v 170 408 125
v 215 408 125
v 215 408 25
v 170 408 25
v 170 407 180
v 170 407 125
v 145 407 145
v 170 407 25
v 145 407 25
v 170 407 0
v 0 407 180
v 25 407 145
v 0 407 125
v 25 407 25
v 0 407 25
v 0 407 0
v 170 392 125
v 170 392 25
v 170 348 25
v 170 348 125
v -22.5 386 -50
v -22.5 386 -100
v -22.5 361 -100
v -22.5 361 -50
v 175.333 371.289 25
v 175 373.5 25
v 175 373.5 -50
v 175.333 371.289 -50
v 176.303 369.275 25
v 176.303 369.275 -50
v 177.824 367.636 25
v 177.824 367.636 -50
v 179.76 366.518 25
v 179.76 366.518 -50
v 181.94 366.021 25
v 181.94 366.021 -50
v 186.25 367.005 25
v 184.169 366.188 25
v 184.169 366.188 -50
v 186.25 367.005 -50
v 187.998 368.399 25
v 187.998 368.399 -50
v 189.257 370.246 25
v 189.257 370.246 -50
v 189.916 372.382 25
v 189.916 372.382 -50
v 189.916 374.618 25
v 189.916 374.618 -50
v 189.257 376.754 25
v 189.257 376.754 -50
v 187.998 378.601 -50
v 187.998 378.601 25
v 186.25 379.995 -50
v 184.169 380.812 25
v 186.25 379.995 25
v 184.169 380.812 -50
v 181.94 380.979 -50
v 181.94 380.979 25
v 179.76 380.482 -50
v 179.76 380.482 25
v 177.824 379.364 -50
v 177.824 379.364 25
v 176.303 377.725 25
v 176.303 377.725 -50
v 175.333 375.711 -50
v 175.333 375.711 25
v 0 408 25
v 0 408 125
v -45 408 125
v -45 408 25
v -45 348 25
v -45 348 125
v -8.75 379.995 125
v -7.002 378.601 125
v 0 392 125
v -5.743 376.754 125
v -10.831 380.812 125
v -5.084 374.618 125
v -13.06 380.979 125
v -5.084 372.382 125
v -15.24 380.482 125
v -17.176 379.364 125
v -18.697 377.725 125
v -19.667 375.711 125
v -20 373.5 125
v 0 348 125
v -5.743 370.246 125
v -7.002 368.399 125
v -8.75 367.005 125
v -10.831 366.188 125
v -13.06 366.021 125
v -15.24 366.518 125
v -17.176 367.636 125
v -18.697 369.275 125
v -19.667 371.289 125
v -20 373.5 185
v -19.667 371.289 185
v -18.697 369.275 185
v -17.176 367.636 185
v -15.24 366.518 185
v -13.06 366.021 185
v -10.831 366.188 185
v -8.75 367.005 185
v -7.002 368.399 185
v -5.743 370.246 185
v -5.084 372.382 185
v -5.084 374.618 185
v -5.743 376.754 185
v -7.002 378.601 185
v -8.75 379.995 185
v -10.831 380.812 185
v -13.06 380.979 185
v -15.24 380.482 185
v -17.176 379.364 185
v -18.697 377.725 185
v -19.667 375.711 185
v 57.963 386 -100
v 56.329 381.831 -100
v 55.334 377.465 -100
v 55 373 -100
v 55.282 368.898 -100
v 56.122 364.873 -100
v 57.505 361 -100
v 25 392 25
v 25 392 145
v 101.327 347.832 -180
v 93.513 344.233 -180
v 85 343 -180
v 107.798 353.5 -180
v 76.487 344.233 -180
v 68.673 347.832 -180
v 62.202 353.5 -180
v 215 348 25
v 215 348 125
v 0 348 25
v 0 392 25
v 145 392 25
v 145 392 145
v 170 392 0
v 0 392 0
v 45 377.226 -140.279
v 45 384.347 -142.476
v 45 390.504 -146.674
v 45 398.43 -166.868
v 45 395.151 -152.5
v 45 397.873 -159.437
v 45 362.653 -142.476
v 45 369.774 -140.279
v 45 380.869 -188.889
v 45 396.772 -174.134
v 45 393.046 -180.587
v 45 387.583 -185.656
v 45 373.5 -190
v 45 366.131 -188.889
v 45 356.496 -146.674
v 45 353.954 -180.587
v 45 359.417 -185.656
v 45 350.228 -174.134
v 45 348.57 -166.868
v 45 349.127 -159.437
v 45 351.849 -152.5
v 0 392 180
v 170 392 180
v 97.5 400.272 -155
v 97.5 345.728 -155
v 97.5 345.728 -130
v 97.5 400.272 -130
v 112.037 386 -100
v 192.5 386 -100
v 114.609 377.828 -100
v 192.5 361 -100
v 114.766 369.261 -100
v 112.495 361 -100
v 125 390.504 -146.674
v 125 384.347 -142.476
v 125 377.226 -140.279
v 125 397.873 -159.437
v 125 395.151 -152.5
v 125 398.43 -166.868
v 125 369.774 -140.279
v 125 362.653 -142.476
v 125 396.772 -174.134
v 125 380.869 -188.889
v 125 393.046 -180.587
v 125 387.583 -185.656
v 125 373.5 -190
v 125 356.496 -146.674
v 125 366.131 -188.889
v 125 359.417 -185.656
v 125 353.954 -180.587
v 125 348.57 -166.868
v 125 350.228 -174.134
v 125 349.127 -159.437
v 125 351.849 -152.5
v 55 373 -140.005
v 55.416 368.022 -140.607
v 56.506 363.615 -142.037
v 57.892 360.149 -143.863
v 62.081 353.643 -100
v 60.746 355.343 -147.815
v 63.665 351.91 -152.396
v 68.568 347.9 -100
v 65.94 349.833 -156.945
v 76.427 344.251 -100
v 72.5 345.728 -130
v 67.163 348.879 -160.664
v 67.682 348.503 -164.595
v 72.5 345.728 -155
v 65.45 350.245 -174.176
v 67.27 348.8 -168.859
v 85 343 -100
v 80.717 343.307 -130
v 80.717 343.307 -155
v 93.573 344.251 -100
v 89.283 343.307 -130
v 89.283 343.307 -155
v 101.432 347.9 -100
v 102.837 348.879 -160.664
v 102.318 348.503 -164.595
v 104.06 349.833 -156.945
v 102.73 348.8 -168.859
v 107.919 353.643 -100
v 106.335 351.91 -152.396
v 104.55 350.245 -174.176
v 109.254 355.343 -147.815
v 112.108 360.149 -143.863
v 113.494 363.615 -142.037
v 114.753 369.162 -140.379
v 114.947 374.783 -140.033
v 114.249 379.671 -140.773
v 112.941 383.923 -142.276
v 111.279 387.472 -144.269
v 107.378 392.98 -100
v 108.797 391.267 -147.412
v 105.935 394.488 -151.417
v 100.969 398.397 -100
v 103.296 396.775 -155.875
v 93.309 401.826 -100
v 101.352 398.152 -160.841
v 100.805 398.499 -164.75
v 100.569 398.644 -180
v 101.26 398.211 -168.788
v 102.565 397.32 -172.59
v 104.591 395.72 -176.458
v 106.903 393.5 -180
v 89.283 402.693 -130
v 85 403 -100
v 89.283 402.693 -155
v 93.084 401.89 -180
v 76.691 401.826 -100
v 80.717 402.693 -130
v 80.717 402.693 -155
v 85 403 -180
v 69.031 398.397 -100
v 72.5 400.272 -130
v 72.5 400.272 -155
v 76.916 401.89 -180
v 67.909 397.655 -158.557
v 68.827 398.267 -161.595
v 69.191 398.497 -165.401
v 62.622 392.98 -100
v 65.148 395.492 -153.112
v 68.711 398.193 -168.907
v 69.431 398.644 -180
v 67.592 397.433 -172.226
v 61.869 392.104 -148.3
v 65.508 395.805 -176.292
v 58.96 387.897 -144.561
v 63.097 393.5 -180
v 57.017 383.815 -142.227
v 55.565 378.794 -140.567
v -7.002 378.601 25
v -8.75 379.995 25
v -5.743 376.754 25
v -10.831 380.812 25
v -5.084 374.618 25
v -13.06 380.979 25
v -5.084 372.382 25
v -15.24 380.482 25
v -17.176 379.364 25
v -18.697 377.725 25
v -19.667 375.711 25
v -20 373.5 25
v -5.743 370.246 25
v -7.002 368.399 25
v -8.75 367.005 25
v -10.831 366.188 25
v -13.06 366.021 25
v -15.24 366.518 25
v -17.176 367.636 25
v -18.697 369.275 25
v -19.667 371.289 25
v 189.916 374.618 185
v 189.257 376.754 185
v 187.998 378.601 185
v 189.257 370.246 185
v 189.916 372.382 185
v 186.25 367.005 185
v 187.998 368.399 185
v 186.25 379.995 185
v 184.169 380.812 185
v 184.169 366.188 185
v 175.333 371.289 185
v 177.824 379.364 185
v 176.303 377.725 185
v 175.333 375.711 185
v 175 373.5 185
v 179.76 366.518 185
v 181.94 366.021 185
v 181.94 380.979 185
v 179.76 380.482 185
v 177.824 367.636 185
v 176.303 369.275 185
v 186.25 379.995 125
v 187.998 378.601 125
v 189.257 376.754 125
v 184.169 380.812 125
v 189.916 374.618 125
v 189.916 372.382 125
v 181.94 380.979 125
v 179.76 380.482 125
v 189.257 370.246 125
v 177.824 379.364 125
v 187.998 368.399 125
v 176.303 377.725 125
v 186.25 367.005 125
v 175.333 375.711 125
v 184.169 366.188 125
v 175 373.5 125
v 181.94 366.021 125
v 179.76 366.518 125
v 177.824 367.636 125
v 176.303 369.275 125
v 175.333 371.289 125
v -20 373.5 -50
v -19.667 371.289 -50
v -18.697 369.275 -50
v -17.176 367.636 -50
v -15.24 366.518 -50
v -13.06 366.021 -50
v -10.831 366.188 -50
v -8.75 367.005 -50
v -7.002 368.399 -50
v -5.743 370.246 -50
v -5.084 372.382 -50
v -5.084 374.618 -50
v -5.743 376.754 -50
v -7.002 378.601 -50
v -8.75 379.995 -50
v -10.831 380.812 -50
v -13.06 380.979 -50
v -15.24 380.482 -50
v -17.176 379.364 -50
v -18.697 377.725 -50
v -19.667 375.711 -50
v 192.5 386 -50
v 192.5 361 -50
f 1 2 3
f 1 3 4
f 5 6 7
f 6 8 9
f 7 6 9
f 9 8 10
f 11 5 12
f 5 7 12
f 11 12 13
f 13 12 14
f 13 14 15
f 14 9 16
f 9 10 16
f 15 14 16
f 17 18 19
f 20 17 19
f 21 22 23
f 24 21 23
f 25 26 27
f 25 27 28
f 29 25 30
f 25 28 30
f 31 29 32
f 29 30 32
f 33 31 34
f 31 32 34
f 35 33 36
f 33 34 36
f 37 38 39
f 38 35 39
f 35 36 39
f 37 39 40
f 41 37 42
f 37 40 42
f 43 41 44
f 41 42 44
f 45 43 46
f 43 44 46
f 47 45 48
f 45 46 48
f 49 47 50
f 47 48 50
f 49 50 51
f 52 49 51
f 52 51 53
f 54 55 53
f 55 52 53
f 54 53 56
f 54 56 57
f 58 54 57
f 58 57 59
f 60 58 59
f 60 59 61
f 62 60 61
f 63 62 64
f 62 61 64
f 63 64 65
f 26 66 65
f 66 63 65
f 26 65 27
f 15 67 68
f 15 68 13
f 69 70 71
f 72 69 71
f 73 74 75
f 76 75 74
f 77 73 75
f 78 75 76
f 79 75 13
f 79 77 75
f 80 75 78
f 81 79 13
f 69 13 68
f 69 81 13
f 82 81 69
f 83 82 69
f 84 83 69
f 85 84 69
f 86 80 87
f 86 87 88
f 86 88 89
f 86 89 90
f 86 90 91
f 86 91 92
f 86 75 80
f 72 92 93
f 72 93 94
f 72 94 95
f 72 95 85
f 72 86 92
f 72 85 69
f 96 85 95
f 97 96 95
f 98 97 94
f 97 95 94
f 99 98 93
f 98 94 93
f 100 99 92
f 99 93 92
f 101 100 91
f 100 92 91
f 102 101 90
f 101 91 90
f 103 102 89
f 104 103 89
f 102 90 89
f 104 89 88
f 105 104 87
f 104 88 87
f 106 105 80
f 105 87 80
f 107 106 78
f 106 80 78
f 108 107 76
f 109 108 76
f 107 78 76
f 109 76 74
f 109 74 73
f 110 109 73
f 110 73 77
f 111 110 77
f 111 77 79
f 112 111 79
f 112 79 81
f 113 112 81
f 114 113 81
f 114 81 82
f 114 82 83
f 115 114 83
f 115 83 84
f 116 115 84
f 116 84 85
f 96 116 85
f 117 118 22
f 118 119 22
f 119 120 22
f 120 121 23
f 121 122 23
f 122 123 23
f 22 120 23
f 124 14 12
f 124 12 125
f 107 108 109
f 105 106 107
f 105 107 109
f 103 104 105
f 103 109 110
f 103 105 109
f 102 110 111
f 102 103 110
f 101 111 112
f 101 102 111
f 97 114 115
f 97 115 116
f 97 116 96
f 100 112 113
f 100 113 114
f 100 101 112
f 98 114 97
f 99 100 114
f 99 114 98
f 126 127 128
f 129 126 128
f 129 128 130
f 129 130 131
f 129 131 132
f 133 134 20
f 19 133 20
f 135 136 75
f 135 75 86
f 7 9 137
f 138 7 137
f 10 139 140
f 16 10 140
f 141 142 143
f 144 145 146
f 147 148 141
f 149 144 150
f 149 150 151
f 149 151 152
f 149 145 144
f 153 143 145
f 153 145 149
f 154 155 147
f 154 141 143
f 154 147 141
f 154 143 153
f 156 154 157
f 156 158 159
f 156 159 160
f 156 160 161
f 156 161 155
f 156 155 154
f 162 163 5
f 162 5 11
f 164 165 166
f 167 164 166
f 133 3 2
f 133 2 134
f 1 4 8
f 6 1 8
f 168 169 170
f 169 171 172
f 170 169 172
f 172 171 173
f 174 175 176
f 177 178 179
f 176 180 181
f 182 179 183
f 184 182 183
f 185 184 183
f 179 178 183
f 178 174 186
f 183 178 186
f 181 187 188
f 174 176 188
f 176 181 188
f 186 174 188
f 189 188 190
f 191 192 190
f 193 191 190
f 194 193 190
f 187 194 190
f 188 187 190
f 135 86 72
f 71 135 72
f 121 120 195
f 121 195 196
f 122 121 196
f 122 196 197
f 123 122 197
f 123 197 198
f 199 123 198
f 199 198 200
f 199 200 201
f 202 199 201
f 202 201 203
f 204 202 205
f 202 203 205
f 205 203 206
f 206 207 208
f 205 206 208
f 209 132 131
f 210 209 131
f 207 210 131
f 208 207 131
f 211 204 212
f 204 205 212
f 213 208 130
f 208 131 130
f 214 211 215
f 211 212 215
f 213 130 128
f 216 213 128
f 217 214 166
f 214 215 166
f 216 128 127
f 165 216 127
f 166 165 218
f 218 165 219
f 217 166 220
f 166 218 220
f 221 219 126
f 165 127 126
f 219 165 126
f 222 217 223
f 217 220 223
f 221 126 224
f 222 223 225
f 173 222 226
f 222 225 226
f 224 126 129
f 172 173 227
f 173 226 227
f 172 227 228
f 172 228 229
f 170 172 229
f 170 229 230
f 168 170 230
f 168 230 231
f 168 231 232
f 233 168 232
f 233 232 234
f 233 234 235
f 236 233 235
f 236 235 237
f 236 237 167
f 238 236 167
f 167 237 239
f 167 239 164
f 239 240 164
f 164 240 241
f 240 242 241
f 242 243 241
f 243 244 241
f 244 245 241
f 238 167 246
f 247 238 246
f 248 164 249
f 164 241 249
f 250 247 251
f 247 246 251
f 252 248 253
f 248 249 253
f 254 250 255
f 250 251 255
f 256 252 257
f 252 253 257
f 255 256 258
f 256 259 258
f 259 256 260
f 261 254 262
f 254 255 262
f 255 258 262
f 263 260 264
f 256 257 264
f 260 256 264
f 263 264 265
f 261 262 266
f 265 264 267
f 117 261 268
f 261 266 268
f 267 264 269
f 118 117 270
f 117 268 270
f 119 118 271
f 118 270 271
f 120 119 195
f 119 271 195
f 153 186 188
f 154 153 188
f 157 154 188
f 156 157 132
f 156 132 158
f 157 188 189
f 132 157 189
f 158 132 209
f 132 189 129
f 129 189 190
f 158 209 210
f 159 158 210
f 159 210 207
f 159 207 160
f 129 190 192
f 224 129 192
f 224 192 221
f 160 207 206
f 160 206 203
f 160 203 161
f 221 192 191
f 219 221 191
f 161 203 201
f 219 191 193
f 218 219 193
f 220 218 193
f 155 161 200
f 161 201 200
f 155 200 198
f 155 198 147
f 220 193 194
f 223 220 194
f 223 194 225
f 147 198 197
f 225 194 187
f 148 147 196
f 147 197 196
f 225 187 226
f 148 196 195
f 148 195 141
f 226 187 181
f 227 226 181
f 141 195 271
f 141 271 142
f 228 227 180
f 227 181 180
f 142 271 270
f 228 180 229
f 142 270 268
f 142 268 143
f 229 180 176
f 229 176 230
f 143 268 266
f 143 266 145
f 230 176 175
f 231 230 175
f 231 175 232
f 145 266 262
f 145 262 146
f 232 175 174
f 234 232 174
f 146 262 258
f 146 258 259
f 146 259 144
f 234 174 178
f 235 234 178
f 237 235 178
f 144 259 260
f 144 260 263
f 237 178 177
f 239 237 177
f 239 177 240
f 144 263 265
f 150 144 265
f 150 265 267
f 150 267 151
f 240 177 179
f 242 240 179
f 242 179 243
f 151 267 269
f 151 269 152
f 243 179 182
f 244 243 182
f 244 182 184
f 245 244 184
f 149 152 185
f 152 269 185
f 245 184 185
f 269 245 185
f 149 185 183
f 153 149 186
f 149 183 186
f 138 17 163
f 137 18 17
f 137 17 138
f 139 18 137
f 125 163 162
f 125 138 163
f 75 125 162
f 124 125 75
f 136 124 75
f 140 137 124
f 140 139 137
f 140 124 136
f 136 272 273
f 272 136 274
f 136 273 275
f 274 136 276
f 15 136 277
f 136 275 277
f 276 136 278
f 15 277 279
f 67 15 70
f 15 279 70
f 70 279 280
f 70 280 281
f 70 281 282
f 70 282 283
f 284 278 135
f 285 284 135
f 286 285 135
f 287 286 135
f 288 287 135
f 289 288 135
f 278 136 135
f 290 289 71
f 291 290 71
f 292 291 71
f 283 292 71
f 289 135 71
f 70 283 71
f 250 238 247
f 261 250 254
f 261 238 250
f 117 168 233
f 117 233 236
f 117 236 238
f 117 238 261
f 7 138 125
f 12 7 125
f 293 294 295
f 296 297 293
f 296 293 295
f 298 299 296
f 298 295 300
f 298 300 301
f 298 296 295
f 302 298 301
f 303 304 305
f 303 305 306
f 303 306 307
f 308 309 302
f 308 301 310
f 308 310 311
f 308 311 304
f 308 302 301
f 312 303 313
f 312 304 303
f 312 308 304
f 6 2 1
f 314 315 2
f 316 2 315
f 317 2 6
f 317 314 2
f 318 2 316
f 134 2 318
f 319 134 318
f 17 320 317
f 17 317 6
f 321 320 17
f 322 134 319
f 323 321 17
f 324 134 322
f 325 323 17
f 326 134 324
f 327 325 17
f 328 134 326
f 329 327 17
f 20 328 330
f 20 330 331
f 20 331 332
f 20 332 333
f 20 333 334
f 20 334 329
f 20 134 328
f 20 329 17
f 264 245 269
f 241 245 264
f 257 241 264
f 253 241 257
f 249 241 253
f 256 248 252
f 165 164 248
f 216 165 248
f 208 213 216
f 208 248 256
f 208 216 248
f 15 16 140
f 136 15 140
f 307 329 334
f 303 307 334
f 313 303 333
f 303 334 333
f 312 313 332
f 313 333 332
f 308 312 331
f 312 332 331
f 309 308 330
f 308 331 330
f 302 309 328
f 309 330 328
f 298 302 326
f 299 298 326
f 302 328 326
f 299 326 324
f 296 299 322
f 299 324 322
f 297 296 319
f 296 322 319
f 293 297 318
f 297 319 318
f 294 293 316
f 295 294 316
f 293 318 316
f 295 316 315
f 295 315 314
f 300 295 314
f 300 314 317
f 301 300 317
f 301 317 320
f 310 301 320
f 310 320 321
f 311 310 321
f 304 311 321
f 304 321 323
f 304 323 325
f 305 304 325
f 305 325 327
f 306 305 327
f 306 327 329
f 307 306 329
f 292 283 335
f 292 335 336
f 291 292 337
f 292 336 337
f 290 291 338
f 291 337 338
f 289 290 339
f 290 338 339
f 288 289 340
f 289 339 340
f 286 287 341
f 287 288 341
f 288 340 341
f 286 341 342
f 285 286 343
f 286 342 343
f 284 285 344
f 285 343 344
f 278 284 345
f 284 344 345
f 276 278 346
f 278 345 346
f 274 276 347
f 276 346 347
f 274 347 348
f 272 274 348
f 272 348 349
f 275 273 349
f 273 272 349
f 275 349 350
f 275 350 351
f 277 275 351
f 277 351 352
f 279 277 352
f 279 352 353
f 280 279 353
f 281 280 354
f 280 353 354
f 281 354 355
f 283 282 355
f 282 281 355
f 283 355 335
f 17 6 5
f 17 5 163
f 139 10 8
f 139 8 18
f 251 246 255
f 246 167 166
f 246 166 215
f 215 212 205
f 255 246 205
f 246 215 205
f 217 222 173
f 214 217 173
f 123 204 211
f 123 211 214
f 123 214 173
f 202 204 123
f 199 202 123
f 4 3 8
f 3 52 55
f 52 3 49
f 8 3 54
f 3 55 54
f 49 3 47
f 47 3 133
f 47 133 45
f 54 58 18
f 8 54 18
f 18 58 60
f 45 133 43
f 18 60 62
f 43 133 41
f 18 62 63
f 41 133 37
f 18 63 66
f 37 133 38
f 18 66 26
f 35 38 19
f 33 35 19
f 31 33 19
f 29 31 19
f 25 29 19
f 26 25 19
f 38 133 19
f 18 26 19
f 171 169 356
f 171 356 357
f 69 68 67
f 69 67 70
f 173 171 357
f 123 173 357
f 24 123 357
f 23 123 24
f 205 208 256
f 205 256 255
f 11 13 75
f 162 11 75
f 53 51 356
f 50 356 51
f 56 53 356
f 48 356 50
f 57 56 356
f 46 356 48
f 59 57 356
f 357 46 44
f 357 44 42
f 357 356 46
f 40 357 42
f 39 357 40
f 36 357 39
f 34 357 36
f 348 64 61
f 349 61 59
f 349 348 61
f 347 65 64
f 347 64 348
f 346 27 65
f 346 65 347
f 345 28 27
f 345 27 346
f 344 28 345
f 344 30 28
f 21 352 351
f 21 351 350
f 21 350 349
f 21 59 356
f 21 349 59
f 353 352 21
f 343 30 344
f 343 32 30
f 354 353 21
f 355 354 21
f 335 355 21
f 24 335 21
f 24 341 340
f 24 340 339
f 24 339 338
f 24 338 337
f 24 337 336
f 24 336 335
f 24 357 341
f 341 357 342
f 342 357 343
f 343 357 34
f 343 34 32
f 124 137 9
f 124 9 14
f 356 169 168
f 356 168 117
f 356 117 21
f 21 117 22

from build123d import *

# Parameters (mm, degrees)
CYLINDER004_R             = 7.5
CYLINDER004_DEPTH         = 240
CYLINDER005_R             = 7.5
CYLINDER005_DEPTH         = 240
BOX030_W                  = 45
BOX030_H                  = 60
BOX030_DEPTH              = 100
BOX031_W                  = 45
BOX031_H                  = 60
BOX031_DEPTH              = 100
BOX032_W                  = 120
BOX032_H                  = 30
BOX032_DEPTH              = 120
BOX028_W                  = 170
BOX028_H                  = 15
BOX028_DEPTH              = 180
BOX033_W                  = 25
BOX033_H                  = 25
BOX033_DEPTH              = 100
CYLINDER006_R             = 30
CYLINDER006_DEPTH         = 80
CYLINDER007_R             = 25
CYLINDER007_DEPTH         = 80
BOX029_W                  = 215
BOX029_H                  = 25
BOX029_DEPTH              = 50
FUSION005_PLACEMENT_ANGLE = 180


with BuildPart() as cylinder004:
    # Cylinder004 → Cylinder004 (new body)
    with BuildSketch(Plane(origin=(-12.5, 33.5, -55), x_dir=(1, 0, 0), z_dir=(0, 0, 1))):
        Circle(CYLINDER004_R)
    extrude(amount=CYLINDER004_DEPTH)


with BuildPart() as cylinder005:
    # Cylinder005 → Cylinder005 (new body)
    with BuildSketch(Plane(origin=(182.5, 33.5, -55), x_dir=(1, 0, 0), z_dir=(0, 0, 1))):
        Circle(CYLINDER005_R)
    extrude(amount=CYLINDER005_DEPTH)


with BuildPart() as cube025:
    # Box030 → Box030 (new body)
    with BuildSketch(Plane(origin=(-45, -1, 25), x_dir=(1, 0, 0), z_dir=(0, 0, 1))):
        with Locations((22.5, 30)):
            Rectangle(BOX030_W, BOX030_H)
    extrude(amount=BOX030_DEPTH)


with BuildPart() as cube026:
    # Box031 → Box031 (new body)
    with BuildSketch(Plane(origin=(170, -1, 25), x_dir=(1, 0, 0), z_dir=(0, 0, 1))):
        with Locations((22.5, 30)):
            Rectangle(BOX031_W, BOX031_H)
    extrude(amount=BOX031_DEPTH)


with BuildPart() as cube027:
    # Box032 → Box032 (new body)
    with BuildSketch(Plane(origin=(25, -1, 25), x_dir=(1, 0, 0), z_dir=(0, 0, 1))):
        with Locations((60, 15)):
            Rectangle(BOX032_W, BOX032_H)
    extrude(amount=BOX032_DEPTH)


with BuildPart() as cut008:
    # Box028 → Box028 (new body)
    with BuildSketch(Plane.XY):
        with Locations((85, 7.5)):
            Rectangle(BOX028_W, BOX028_H)
    extrude(amount=BOX028_DEPTH)

    # Cut008: cut Cube027
    add(cube027.part, mode=Mode.SUBTRACT)


with BuildPart() as cube028:
    # Box033 → Box033 (new body)
    with BuildSketch(Plane(origin=(72.5, 76.5, -155), x_dir=(1, 0, 0), z_dir=(0, -1, 0))):
        with Locations((12.5, 12.5)):
            Rectangle(BOX033_W, BOX033_H)
    extrude(amount=BOX033_DEPTH)


with BuildPart() as cylinder006:
    # Cylinder006 → Cylinder006 (new body)
    with BuildSketch(Plane(origin=(85, 34, -180), x_dir=(1, 0, 0), z_dir=(0, 0, 1))):
        Circle(CYLINDER006_R)
    extrude(amount=CYLINDER006_DEPTH)


with BuildPart() as cut009:
    # Cylinder007 → Cylinder007 (new body)
    with BuildSketch(Plane(origin=(45, 33.5, -165), x_dir=(0, 0, -1), z_dir=(1, 0, 0))):
        Circle(CYLINDER007_R)
    extrude(amount=CYLINDER007_DEPTH)

    # Fusion004: union Cylinder006
    add(cylinder006.part)

    # Cut009: cut Cube028
    add(cube028.part, mode=Mode.SUBTRACT)


with BuildPart() as standard001:
    # Box029 → Box029 (new body)
    with BuildSketch(Plane(origin=(-22.5, 21, -100), x_dir=(1, 0, 0), z_dir=(0, 0, 1))):
        with Locations((107.5, 12.5)):
            Rectangle(BOX029_W, BOX029_H)
    extrude(amount=BOX029_DEPTH)

    # Fusion005: union Cylinder004, Cylinder005, Cube025, Cube026, Cut008, Cut009
    add(cylinder004.part)
    add(cylinder005.part)
    add(cube025.part)
    add(cube026.part)
    add(cut008.part)
    add(cut009.part)


with BuildPart() as standard001_1:
    # Fusion005 placement: moved
    add(standard001.part.moved(Location((170, 407, 0))).rotate(Axis((170, 407, 0), (0, 0, 1)), FUSION005_PLACEMENT_ANGLE))


solid = standard001_1.part
